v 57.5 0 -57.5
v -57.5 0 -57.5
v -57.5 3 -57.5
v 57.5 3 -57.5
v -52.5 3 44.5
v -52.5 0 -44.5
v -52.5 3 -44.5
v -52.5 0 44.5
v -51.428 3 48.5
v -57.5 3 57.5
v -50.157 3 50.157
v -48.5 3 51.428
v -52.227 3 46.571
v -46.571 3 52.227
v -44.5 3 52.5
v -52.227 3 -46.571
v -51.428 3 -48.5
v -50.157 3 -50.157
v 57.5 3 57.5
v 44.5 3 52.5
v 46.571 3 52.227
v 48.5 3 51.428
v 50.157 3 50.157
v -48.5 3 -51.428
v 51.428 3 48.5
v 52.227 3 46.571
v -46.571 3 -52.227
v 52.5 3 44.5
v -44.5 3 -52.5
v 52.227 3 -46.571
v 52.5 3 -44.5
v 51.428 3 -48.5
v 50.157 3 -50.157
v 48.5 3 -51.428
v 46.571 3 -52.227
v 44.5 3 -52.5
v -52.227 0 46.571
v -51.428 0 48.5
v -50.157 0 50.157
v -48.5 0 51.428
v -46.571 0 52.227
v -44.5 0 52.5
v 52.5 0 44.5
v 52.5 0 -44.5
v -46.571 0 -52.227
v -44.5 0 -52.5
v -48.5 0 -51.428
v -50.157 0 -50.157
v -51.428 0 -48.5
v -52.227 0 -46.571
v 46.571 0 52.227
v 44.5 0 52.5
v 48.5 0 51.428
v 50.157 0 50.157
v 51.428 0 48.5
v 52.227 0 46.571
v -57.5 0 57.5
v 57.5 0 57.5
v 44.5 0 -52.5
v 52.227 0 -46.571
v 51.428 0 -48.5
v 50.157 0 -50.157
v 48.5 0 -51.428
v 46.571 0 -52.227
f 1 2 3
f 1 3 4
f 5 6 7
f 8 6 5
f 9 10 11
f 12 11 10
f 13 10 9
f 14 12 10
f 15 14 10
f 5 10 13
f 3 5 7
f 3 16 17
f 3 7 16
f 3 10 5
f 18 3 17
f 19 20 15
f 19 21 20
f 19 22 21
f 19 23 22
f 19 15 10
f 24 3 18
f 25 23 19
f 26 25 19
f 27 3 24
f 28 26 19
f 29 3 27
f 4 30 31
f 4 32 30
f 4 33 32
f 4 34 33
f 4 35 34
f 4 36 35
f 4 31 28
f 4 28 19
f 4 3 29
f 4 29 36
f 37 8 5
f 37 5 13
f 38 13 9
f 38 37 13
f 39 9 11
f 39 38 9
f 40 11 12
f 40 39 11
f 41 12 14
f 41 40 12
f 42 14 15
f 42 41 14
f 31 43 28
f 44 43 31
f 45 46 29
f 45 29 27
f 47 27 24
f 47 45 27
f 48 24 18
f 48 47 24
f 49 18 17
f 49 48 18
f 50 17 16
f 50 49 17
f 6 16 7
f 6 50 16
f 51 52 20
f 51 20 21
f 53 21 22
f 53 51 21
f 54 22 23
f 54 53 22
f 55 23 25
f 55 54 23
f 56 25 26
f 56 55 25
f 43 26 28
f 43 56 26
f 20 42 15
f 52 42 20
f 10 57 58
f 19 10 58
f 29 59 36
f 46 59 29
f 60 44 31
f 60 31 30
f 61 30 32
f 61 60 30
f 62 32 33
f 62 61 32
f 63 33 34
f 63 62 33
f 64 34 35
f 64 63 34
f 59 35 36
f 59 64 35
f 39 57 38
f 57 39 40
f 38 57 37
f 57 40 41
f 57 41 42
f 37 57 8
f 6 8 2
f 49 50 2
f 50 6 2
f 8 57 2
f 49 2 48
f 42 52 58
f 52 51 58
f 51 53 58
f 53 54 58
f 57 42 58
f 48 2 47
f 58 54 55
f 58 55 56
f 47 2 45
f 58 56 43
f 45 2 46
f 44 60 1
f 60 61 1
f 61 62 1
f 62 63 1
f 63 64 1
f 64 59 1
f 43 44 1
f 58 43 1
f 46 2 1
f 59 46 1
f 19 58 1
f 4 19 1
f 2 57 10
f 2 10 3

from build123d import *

# Parameters (mm, degrees)
SKETCH_1_W      = 115
SKETCH_1_H      = 115
EXTRUDE_1_DEPTH = 3


with BuildPart() as part:
    # Эскиз1 → Бобышка-Вытянуть1 (new body)
    with BuildSketch(Plane(origin=(0, 0, 0), x_dir=(1, 0, 0), z_dir=(0, 1, 0))):
        Rectangle(SKETCH_1_W, SKETCH_1_H)
        with BuildLine():
            Line((-44.5, -52.5), (44.5, -52.5))
            ThreePointArc((44.5, -52.5), (50.156854249, -50.156854249), (52.5, -44.5))
            Line((52.5, -44.5), (52.5, 44.5))
            ThreePointArc((52.5, 44.5), (50.156854249, 50.156854249), (44.5, 52.5))
            Line((44.5, 52.5), (-44.5, 52.5))
            ThreePointArc((-44.5, 52.5), (-50.156854249, 50.156854249), (-52.5, 44.5))
            Line((-52.5, 44.5), (-52.5, -44.5))
            ThreePointArc((-52.5, -44.5), (-50.156854249, -50.156854249), (-44.5, -52.5))
        make_face(mode=Mode.SUBTRACT)
    extrude(amount=EXTRUDE_1_DEPTH)


solid = part.part
